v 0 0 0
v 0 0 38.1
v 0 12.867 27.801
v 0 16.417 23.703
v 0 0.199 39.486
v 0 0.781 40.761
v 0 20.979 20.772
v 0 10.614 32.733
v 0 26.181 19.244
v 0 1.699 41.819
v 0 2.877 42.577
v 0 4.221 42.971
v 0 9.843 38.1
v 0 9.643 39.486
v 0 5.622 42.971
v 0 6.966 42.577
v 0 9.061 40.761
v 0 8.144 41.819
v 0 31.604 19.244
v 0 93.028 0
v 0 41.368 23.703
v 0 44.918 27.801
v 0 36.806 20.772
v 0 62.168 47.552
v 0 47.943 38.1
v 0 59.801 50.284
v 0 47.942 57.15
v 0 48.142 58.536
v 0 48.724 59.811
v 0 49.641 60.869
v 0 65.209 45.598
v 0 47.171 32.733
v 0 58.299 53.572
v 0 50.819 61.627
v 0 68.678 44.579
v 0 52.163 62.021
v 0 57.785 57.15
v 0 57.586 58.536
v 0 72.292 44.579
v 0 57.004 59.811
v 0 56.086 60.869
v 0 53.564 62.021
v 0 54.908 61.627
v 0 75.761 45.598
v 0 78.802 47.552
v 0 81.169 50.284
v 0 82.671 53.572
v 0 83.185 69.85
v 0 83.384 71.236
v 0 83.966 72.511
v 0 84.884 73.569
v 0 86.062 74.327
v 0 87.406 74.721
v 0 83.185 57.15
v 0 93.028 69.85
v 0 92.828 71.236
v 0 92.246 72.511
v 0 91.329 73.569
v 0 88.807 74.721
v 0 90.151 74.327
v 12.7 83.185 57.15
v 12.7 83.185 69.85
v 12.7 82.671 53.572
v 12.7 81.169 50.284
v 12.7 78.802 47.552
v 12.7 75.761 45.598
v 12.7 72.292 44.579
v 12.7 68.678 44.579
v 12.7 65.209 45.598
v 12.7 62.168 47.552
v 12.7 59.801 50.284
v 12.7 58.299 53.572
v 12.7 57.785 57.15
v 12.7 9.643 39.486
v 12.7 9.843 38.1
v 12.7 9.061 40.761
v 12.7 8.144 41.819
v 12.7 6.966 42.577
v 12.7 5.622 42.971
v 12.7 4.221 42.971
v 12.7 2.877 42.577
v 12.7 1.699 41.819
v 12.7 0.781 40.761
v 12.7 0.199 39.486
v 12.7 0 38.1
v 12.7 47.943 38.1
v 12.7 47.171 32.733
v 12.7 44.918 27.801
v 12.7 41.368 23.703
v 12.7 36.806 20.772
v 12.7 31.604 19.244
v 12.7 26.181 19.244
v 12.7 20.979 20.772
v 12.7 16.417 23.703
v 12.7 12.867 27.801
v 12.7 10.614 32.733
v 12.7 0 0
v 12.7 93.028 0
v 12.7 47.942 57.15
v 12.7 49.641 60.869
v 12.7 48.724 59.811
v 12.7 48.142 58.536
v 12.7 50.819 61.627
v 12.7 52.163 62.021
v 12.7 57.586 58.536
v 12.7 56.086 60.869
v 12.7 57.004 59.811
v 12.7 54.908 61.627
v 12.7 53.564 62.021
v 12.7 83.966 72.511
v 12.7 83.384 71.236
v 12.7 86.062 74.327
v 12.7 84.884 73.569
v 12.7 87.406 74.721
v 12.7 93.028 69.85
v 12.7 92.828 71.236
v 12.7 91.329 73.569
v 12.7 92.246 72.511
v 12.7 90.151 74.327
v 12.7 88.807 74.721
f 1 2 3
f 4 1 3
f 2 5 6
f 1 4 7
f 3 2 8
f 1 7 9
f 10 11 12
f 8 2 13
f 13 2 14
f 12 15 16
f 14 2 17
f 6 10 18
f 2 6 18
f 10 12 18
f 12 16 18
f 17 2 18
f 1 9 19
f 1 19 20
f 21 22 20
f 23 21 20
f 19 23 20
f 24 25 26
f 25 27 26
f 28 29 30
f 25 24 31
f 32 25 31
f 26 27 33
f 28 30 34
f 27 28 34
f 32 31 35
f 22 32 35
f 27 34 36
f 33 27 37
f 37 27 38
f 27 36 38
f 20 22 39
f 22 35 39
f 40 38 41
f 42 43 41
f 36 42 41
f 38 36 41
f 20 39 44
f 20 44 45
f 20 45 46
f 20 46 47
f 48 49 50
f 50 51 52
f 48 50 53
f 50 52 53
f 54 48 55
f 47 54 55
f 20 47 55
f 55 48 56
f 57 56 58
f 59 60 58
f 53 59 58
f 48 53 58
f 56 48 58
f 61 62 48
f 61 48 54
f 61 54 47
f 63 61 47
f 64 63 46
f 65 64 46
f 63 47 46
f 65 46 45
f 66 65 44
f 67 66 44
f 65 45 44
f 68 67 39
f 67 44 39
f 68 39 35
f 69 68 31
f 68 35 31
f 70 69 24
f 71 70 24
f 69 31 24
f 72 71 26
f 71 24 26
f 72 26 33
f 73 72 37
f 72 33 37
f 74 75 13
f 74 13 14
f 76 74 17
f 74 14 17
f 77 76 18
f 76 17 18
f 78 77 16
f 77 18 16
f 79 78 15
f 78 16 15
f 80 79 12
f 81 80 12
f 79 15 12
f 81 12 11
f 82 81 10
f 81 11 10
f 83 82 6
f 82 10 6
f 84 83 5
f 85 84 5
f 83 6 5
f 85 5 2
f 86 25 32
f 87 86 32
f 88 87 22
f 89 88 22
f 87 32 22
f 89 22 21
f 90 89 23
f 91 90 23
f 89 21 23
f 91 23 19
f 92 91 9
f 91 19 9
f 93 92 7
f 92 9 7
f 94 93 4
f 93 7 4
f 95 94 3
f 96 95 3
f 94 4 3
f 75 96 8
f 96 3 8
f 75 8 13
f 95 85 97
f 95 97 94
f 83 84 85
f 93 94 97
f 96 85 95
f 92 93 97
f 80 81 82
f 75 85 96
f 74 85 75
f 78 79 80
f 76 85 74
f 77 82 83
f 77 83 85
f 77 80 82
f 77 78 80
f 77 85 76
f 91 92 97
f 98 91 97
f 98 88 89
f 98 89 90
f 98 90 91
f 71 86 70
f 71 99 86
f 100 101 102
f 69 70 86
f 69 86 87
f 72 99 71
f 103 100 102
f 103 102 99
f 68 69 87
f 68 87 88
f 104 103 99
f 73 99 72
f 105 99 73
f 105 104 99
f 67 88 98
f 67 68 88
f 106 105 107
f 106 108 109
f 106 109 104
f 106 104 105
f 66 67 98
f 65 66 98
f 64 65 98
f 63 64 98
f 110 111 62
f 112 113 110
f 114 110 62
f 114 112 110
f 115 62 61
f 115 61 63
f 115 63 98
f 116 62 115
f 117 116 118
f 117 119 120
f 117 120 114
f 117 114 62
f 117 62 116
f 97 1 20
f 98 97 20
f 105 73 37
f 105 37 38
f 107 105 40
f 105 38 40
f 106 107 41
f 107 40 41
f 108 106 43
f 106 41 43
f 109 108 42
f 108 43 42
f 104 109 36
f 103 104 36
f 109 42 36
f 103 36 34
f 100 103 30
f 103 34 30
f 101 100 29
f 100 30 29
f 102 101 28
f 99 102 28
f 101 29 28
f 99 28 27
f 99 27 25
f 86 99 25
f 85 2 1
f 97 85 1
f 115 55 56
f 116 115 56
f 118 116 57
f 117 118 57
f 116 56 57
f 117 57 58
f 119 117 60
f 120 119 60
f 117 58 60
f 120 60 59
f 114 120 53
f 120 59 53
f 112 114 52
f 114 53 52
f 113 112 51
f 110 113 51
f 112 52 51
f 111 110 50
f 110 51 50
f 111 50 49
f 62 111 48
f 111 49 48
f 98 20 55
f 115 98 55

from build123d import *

# Parameters (mm, degrees)
F1_DEPTH = 12.7


with BuildPart() as f1:
    # F0 (on Right) → F1 (new body)
    with BuildSketch(Plane.YZ):
        with BuildLine():
            Line((0, 38.1), (0, 0))
            Line((0, 0), (93.0275, 0))
            Line((93.0275, 0), (93.0275, 69.85))
            ThreePointArc((93.0275, 69.85), (88.10625, 74.77125), (83.185, 69.85))
            Line((83.185, 69.85), (83.185, 57.15))
            ThreePointArc((83.185, 57.15), (70.485, 44.45), (57.785, 57.15))
            ThreePointArc((57.785, 57.15), (52.86375, 62.07125), (47.9425, 57.15))
            Line((47.9425, 57.15), (47.9425, 38.1))
            ThreePointArc((47.9425, 38.1), (28.8925, 19.05), (9.8425, 38.1))
            ThreePointArc((9.8425, 38.1), (4.92125, 43.02125), (0, 38.1))
        make_face()
    extrude(amount=F1_DEPTH)


solid = f1.part
